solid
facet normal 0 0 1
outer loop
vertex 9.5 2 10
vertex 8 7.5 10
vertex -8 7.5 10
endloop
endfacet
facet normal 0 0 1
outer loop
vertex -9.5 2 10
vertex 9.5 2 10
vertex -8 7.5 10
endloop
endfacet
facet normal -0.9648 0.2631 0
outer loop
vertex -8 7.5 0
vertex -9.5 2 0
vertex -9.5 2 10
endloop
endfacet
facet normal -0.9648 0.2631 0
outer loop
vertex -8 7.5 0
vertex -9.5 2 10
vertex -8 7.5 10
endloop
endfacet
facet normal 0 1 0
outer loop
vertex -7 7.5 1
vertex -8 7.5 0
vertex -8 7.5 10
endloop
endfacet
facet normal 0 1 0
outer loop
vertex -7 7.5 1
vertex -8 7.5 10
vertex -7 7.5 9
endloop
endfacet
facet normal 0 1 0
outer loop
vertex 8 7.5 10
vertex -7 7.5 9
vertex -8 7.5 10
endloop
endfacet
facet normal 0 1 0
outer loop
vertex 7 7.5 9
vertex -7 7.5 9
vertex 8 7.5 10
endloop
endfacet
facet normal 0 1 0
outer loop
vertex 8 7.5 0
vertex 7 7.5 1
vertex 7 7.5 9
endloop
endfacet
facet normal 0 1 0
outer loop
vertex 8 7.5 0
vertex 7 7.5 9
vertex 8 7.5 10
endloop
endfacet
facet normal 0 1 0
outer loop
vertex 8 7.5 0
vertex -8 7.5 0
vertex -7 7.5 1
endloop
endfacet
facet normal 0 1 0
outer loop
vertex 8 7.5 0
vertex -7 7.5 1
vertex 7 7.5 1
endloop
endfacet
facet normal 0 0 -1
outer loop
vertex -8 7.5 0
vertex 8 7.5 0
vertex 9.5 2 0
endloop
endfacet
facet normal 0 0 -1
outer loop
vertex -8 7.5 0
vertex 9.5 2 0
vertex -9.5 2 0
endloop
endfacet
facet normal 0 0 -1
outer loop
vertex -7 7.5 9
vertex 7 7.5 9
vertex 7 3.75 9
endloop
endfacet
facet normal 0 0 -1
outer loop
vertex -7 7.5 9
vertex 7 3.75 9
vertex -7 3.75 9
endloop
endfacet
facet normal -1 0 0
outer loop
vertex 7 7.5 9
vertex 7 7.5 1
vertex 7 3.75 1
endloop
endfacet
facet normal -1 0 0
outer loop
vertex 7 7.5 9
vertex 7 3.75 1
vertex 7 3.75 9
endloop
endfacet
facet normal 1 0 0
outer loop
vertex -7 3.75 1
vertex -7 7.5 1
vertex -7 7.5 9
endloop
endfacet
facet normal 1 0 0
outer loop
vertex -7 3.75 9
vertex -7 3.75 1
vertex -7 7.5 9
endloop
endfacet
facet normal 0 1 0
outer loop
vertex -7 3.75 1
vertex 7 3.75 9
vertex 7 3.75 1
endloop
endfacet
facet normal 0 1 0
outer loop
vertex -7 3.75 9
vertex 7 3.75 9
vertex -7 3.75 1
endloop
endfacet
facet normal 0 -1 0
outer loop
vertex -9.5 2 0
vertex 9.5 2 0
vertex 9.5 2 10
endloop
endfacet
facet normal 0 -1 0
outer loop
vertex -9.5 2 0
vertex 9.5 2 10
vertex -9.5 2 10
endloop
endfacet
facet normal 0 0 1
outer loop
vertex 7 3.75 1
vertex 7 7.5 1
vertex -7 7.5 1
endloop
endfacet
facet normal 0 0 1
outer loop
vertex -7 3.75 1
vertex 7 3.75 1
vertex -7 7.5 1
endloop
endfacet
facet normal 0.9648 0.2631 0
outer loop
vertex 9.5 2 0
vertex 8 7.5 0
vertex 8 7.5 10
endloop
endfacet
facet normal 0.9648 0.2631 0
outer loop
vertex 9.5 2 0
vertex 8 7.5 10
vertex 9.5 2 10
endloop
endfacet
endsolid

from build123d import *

# Parameters (mm, degrees)
SKETCH003_W      = 14
SKETCH003_H      = 8
EXTRUDE002_DEPTH = 3.75
EXTRUDE001_DEPTH = 10


with BuildPart() as extrude002:
    # Sketch003 (on Face2 of Extrude001) → Extrude002 (new body, symmetric)
    with BuildSketch(Plane(origin=(0, 7.5, 0), x_dir=(-1, 0, 0), z_dir=(0, 1, 0))):
        with Locations((0, 5)):
            Rectangle(SKETCH003_W, SKETCH003_H)
    extrude(amount=EXTRUDE002_DEPTH, both=True)


with BuildPart() as cut:
    # Sketch001 → Extrude001 (new body)
    with BuildSketch(Plane.XY):
        Polygon((-9.5, 2), (-8, 7.5), (8, 7.5), (9.5, 2), align=None)
    extrude(amount=EXTRUDE001_DEPTH)

    # Cut: cut Extrude002
    add(extrude002.part, mode=Mode.SUBTRACT)


solid = cut.part
